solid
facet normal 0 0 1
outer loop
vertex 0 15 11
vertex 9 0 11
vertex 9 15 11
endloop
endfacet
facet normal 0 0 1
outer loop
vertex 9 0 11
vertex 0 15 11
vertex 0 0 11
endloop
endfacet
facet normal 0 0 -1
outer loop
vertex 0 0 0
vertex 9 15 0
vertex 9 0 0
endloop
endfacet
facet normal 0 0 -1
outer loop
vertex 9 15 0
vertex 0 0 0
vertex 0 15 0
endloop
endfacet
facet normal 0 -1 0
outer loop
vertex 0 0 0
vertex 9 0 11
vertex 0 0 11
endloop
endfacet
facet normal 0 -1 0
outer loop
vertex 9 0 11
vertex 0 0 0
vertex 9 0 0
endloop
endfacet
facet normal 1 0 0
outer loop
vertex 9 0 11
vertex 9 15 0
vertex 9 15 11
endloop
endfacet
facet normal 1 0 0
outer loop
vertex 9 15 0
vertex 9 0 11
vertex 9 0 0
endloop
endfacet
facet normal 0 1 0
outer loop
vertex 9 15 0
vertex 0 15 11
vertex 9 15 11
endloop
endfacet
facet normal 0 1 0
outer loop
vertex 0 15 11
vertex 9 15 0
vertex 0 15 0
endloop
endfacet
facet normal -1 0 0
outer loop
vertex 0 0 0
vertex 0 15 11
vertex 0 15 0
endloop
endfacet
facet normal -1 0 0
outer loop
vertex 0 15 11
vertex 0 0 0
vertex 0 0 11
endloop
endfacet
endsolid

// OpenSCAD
// Generated by SolidPython 1.0.1 on 2020-07-29 00:46:55


cube(size = [9, 15, 11]);
/***********************************************
*********      SolidPython code:      **********
************************************************
 
# import packages: SolidPython
from solid import *
from solid.utils import *
from itertools import chain, combinations, permutations


class Resize:

    def __init__(self, scad_file):
        self.scad_file = scad_file
        #self.scad_file = import_scad(scad_file)
        # cone/cylinder param:
        self.r1 = 0
        self.r2 = 0
        self.h = 0
        # rectangular prism param:
        self.w = 0
        self.l = 0
        # ellipse param:
        self.r = 0

    # import OpenScad code (file name corresponds to shape)


    # classify shape + parameters
    def assign(self, param1, param2, param3):
        if self.scad_file == 'cone.scad':
            self.r1 = param1
            self.r2 = param2
            self.h = param3
        elif self.scad_file == 'cylinder.scad':
            self.r1 = param1
            self.r2 = param2
            self.h = param3
        elif self.scad_file == 'rectangularPrism.scad':
            self.h = param1
            self.l = param2
            self.w = param3
        else:
            self.r = param1
            self.h = param2

    # resize parameters
    def iterate(self):
        x = range(3, 20, 2)
        i = 1
        if self.scad_file == 'cone.scad':
            tempList = list(permutations(x, 2))
            for temp in tempList:
                param1 = temp[0]
                param2 = temp[1]
                filepath = 'produced_scad_files/' + 'cone' + str(param1) + '_' + str(param2) + '_' + '.scad'
                scad_render_to_file(cylinder(h=param1, r1=param2, r2=0), filepath)

        elif self.scad_file == 'cylinder.scad':
            tempList = list(permutations(x, 3))
            for temp in tempList:
                param1 = temp[0]
                param2 = temp[1]
                filepath = 'produced_scad_files/' + 'cylinder' + str(param1) + '_' + str(param2) + '_' + '.scad'
                scad_render_to_file(cylinder(h=param1, r1=param2, r2=param2), filepath)

        elif self.scad_file == 'rectangularPrism.scad':
            tempList = list(permutations(x, 3))
            for temp in tempList:
                param1 = temp[0]
                param2 = temp[1]
                param3 = temp[2]
                filepath = 'produced_scad_files/' + 'rectangularPrism' + str(param1) + '_' + str(param2) + '_' + str(
                    param3) + '.scad'
                scad_render_to_file(cube(size=(param1, param2, param3)), filepath)

        elif self.scad_file == 'ellipse.scad':
            tempList = list(permutations(x, 4))
            for temp in tempList:
                param1 = temp[0]
                param2 = temp[1]
                param3 = temp[2]
                param4 = temp[3]
                filepath = 'produced_scad_files/' + 'ellipse' + str(param1) + '_' + str(param2) + '_' + str(param3) + '_' + str(param4) + '.scad'
                scad_render_to_file(scale([param1, param2, param3])(sphere(r=param4)), filepath)

    def render_to_scadfile(self):
        scad_render_to_file(scad, 'example.scad') 
 
************************************************/
